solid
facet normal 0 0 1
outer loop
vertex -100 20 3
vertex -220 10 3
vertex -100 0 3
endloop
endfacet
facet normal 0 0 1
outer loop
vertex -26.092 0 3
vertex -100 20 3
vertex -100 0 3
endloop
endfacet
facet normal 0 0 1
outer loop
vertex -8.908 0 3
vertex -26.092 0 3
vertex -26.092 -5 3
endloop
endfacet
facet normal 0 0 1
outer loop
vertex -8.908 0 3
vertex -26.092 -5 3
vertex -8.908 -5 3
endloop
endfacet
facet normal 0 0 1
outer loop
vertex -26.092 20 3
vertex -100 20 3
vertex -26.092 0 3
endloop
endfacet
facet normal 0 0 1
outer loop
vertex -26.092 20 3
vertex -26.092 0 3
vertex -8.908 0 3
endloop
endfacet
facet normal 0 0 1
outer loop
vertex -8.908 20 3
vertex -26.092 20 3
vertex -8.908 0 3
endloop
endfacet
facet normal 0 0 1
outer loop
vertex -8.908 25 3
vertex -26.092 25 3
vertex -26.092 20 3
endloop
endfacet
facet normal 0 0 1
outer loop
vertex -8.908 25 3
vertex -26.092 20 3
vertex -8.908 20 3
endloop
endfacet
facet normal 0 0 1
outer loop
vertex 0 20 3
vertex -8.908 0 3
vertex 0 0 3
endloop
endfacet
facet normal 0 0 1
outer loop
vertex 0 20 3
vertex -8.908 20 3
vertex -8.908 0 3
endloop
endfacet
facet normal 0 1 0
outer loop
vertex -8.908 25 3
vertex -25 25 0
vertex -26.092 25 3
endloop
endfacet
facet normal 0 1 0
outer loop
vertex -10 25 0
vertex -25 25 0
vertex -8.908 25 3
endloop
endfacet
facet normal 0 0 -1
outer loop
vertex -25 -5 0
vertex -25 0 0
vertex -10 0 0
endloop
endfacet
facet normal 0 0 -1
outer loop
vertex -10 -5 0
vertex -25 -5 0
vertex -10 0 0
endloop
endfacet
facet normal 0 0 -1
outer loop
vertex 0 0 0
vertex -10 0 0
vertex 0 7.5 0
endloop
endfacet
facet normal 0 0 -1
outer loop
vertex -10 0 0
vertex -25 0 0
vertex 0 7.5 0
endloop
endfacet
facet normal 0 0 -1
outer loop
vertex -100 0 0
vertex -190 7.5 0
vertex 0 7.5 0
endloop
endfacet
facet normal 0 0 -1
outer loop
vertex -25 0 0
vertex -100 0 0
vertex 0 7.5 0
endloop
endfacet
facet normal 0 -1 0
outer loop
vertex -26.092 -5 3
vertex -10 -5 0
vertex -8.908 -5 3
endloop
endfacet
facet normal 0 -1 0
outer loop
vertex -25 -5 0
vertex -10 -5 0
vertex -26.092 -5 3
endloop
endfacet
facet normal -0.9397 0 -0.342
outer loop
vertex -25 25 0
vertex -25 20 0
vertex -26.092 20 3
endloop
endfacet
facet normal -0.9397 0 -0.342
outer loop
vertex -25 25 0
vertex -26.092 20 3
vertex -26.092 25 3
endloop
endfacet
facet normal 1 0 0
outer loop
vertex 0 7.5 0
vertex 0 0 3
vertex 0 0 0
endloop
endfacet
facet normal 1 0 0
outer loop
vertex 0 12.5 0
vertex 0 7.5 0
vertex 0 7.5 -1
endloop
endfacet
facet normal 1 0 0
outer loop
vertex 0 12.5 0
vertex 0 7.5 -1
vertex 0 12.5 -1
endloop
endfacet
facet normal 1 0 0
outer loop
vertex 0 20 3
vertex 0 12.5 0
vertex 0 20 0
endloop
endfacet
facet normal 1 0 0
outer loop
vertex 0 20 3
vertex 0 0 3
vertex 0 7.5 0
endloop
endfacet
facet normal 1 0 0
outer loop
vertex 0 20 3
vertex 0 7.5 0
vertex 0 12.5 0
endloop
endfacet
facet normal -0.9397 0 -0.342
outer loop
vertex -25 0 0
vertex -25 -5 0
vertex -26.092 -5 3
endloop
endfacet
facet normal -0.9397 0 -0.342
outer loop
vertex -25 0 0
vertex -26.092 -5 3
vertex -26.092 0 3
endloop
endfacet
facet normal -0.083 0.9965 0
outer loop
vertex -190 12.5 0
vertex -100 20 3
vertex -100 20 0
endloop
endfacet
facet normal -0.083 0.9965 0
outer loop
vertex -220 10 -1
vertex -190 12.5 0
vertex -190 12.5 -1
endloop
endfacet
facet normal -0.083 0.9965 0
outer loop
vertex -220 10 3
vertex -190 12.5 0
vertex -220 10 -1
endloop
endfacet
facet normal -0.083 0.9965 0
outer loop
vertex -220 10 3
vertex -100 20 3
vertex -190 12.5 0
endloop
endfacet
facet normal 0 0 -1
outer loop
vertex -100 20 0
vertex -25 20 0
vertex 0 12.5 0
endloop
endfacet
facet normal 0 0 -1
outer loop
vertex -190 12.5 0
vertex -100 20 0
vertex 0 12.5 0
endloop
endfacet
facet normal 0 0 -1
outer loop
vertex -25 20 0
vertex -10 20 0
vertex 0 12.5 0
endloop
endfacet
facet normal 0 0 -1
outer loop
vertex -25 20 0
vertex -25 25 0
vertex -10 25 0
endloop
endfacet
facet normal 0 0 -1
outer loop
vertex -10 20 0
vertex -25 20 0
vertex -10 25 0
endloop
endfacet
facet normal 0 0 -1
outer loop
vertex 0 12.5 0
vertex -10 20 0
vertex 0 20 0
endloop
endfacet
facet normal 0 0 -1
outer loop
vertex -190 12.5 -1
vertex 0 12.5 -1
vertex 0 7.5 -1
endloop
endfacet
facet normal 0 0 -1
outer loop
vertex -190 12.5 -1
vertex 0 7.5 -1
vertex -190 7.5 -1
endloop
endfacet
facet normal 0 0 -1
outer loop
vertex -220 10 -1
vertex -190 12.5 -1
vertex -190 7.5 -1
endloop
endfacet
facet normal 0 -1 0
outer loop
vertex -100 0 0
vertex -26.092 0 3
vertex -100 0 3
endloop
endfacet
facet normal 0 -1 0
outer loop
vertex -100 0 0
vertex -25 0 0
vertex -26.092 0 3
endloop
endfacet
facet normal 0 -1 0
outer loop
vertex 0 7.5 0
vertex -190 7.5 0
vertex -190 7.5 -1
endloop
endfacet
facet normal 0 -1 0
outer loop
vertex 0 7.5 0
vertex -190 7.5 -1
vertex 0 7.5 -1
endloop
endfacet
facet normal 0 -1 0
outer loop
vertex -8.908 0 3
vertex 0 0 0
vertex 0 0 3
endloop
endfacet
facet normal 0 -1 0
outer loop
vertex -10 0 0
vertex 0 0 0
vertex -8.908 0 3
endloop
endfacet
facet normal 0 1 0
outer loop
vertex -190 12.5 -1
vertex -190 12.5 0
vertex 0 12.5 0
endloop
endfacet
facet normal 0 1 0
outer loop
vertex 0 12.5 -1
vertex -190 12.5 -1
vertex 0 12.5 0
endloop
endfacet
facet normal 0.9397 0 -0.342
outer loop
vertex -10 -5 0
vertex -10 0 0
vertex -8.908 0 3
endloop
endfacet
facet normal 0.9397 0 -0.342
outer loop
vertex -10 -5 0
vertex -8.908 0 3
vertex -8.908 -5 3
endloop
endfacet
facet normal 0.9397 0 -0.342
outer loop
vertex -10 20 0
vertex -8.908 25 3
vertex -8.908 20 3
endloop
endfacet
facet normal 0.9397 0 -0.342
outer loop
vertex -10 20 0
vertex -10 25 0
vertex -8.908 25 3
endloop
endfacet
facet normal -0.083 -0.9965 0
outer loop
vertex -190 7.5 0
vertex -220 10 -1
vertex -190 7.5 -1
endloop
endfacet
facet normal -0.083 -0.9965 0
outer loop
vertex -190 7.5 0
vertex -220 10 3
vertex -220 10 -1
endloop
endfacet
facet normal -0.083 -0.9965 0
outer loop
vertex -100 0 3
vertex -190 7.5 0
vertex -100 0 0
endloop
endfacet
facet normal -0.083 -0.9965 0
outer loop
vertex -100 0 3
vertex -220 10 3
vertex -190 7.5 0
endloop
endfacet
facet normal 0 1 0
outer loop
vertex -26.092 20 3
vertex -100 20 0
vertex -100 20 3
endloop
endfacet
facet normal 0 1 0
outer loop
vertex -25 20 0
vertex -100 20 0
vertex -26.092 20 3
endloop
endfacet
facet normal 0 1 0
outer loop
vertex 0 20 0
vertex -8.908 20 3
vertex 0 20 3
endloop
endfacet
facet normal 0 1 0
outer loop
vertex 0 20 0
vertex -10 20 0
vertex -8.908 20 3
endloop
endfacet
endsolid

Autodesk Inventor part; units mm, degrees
ref_plane "YZ Plane" through (0, 0, 0) normal (1, 0, 0) x (0, 1, 0)
ref_plane "XZ Plane" through (0, 0, 0) normal (0, 1, 0) x (-1, 0, 0)
ref_plane "XY Plane" through (0, 0, 0) normal (0, 0, 1) x (1, 0, 0)
sketch "Sketch1" plane through (0, 0, 0) normal (0, 0, 1) x (1, 0, 0)
  line L0 (0, 0) -> (-100, 0)
  line L1 (-100, 20) -> (0, 20)
  line L2 (0, 20) -> (0, 0)
  line L3 (-100, 20) -> (-220, 10)
  line L4 (-220, 10) -> (-100, 0)
  line L5 (-25, 25) -> (-10, 25)
  line L6 (-10, 25) -> (-10, 20)
  line L7 (-10, 20) -> (-25, 20)
  line L8 (-25, 20) -> (-25, 25)
  line L9 (-25, 0) -> (-10, 0)
  line L10 (-10, 0) -> (-10, -5)
  line L11 (-10, -5) -> (-25, -5)
  line L12 (-25, -5) -> (-25, 0)
  dimension "d0" = 100
  dimension "d1" = 20
  dimension "d2" = 220
  dimension "d3" = 10
  dimension "d4" = 15
  dimension "d5" = 5
  dimension "d6" = 10
extrude "Cuerpo" add sketch "Sketch1" along normal blind 3
sketch "Sketch2" plane through (0, 0, 0) normal (0, 0, -1) x (-1, 0, 0)
  line L0 (0, 0) -> (0, 20) projected
  line L1 (100, 20) -> (220, 10) projected
  line L2 (220, 10) -> (100, 0) projected
  line L3 (190, 7.5) -> (0, 7.5)
  line L4 (190, 12.5) -> (0, 12.5)
  dimension "d9" = 5
extrude "Rail" add sketch "Sketch2" along normal blind 1
draft "FaceDraft1" angle -20 pull direction (0, 0, 1) faces at (-25, -1.6667, 1) fixed edges at (-25, -2.5, 0)
draft "FaceDraft2" angle -20 pull direction (0, 0, 1) faces at (-10, -3.3333, 1) fixed edges at (-10, -2.5, 0)
draft "FaceDraft3" angle -20 pull direction (0, 0, 1) faces at (-10, 21.6667, 1) fixed edges at (-10, 22.5, 0)
draft "FaceDraft4" angle -20 pull direction (0, 0, 1) faces at (-25, 23.3333, 1) fixed edges at (-25, 22.5, 0)
equation "\"d0\" = hoja_cuerpo_largo"
equation "\"d1\" = hoja_ancho"
equation "\"d2\" = hoja_largo"
equation "\"d3\" = hoja_diente_separacion"
equation "\"d4\" = hoja_diente_largo"
equation "\"d5\" = hoja_diente_ancho"
equation "\"d6\" = d3"
equation "\"d7\" = hoja_grosor"
equation "\"d9\" = hoja_rail_ancho"
equation "\"d10\" = hoja_rail_alto"
equation "\"d12\" = tirador_diente_agarre"
equation "\"d13\" = tirador_diente_agarre"
equation "\"d14\" = tirador_diente_agarre"
equation "\"d15\" = tirador_diente_agarre"
equation "\"hoja_cuerpo_largo\" = 100"
equation "\"hoja_ancho\" = 20"
equation "\"hoja_largo\" = 220"
equation "\"hoja_diente_separacion\" = 10"
equation "\"hoja_diente_largo\" = 15"
equation "\"hoja_diente_ancho\" = 5"
equation "\"hoja_grosor\" = 3"
equation "\"hoja_rail_ancho\" = 5"
equation "\"hoja_rail_alto\" = 1"
equation "\"tirador_diente_agarre\" = -20deg"
properties part number "Hoja"
